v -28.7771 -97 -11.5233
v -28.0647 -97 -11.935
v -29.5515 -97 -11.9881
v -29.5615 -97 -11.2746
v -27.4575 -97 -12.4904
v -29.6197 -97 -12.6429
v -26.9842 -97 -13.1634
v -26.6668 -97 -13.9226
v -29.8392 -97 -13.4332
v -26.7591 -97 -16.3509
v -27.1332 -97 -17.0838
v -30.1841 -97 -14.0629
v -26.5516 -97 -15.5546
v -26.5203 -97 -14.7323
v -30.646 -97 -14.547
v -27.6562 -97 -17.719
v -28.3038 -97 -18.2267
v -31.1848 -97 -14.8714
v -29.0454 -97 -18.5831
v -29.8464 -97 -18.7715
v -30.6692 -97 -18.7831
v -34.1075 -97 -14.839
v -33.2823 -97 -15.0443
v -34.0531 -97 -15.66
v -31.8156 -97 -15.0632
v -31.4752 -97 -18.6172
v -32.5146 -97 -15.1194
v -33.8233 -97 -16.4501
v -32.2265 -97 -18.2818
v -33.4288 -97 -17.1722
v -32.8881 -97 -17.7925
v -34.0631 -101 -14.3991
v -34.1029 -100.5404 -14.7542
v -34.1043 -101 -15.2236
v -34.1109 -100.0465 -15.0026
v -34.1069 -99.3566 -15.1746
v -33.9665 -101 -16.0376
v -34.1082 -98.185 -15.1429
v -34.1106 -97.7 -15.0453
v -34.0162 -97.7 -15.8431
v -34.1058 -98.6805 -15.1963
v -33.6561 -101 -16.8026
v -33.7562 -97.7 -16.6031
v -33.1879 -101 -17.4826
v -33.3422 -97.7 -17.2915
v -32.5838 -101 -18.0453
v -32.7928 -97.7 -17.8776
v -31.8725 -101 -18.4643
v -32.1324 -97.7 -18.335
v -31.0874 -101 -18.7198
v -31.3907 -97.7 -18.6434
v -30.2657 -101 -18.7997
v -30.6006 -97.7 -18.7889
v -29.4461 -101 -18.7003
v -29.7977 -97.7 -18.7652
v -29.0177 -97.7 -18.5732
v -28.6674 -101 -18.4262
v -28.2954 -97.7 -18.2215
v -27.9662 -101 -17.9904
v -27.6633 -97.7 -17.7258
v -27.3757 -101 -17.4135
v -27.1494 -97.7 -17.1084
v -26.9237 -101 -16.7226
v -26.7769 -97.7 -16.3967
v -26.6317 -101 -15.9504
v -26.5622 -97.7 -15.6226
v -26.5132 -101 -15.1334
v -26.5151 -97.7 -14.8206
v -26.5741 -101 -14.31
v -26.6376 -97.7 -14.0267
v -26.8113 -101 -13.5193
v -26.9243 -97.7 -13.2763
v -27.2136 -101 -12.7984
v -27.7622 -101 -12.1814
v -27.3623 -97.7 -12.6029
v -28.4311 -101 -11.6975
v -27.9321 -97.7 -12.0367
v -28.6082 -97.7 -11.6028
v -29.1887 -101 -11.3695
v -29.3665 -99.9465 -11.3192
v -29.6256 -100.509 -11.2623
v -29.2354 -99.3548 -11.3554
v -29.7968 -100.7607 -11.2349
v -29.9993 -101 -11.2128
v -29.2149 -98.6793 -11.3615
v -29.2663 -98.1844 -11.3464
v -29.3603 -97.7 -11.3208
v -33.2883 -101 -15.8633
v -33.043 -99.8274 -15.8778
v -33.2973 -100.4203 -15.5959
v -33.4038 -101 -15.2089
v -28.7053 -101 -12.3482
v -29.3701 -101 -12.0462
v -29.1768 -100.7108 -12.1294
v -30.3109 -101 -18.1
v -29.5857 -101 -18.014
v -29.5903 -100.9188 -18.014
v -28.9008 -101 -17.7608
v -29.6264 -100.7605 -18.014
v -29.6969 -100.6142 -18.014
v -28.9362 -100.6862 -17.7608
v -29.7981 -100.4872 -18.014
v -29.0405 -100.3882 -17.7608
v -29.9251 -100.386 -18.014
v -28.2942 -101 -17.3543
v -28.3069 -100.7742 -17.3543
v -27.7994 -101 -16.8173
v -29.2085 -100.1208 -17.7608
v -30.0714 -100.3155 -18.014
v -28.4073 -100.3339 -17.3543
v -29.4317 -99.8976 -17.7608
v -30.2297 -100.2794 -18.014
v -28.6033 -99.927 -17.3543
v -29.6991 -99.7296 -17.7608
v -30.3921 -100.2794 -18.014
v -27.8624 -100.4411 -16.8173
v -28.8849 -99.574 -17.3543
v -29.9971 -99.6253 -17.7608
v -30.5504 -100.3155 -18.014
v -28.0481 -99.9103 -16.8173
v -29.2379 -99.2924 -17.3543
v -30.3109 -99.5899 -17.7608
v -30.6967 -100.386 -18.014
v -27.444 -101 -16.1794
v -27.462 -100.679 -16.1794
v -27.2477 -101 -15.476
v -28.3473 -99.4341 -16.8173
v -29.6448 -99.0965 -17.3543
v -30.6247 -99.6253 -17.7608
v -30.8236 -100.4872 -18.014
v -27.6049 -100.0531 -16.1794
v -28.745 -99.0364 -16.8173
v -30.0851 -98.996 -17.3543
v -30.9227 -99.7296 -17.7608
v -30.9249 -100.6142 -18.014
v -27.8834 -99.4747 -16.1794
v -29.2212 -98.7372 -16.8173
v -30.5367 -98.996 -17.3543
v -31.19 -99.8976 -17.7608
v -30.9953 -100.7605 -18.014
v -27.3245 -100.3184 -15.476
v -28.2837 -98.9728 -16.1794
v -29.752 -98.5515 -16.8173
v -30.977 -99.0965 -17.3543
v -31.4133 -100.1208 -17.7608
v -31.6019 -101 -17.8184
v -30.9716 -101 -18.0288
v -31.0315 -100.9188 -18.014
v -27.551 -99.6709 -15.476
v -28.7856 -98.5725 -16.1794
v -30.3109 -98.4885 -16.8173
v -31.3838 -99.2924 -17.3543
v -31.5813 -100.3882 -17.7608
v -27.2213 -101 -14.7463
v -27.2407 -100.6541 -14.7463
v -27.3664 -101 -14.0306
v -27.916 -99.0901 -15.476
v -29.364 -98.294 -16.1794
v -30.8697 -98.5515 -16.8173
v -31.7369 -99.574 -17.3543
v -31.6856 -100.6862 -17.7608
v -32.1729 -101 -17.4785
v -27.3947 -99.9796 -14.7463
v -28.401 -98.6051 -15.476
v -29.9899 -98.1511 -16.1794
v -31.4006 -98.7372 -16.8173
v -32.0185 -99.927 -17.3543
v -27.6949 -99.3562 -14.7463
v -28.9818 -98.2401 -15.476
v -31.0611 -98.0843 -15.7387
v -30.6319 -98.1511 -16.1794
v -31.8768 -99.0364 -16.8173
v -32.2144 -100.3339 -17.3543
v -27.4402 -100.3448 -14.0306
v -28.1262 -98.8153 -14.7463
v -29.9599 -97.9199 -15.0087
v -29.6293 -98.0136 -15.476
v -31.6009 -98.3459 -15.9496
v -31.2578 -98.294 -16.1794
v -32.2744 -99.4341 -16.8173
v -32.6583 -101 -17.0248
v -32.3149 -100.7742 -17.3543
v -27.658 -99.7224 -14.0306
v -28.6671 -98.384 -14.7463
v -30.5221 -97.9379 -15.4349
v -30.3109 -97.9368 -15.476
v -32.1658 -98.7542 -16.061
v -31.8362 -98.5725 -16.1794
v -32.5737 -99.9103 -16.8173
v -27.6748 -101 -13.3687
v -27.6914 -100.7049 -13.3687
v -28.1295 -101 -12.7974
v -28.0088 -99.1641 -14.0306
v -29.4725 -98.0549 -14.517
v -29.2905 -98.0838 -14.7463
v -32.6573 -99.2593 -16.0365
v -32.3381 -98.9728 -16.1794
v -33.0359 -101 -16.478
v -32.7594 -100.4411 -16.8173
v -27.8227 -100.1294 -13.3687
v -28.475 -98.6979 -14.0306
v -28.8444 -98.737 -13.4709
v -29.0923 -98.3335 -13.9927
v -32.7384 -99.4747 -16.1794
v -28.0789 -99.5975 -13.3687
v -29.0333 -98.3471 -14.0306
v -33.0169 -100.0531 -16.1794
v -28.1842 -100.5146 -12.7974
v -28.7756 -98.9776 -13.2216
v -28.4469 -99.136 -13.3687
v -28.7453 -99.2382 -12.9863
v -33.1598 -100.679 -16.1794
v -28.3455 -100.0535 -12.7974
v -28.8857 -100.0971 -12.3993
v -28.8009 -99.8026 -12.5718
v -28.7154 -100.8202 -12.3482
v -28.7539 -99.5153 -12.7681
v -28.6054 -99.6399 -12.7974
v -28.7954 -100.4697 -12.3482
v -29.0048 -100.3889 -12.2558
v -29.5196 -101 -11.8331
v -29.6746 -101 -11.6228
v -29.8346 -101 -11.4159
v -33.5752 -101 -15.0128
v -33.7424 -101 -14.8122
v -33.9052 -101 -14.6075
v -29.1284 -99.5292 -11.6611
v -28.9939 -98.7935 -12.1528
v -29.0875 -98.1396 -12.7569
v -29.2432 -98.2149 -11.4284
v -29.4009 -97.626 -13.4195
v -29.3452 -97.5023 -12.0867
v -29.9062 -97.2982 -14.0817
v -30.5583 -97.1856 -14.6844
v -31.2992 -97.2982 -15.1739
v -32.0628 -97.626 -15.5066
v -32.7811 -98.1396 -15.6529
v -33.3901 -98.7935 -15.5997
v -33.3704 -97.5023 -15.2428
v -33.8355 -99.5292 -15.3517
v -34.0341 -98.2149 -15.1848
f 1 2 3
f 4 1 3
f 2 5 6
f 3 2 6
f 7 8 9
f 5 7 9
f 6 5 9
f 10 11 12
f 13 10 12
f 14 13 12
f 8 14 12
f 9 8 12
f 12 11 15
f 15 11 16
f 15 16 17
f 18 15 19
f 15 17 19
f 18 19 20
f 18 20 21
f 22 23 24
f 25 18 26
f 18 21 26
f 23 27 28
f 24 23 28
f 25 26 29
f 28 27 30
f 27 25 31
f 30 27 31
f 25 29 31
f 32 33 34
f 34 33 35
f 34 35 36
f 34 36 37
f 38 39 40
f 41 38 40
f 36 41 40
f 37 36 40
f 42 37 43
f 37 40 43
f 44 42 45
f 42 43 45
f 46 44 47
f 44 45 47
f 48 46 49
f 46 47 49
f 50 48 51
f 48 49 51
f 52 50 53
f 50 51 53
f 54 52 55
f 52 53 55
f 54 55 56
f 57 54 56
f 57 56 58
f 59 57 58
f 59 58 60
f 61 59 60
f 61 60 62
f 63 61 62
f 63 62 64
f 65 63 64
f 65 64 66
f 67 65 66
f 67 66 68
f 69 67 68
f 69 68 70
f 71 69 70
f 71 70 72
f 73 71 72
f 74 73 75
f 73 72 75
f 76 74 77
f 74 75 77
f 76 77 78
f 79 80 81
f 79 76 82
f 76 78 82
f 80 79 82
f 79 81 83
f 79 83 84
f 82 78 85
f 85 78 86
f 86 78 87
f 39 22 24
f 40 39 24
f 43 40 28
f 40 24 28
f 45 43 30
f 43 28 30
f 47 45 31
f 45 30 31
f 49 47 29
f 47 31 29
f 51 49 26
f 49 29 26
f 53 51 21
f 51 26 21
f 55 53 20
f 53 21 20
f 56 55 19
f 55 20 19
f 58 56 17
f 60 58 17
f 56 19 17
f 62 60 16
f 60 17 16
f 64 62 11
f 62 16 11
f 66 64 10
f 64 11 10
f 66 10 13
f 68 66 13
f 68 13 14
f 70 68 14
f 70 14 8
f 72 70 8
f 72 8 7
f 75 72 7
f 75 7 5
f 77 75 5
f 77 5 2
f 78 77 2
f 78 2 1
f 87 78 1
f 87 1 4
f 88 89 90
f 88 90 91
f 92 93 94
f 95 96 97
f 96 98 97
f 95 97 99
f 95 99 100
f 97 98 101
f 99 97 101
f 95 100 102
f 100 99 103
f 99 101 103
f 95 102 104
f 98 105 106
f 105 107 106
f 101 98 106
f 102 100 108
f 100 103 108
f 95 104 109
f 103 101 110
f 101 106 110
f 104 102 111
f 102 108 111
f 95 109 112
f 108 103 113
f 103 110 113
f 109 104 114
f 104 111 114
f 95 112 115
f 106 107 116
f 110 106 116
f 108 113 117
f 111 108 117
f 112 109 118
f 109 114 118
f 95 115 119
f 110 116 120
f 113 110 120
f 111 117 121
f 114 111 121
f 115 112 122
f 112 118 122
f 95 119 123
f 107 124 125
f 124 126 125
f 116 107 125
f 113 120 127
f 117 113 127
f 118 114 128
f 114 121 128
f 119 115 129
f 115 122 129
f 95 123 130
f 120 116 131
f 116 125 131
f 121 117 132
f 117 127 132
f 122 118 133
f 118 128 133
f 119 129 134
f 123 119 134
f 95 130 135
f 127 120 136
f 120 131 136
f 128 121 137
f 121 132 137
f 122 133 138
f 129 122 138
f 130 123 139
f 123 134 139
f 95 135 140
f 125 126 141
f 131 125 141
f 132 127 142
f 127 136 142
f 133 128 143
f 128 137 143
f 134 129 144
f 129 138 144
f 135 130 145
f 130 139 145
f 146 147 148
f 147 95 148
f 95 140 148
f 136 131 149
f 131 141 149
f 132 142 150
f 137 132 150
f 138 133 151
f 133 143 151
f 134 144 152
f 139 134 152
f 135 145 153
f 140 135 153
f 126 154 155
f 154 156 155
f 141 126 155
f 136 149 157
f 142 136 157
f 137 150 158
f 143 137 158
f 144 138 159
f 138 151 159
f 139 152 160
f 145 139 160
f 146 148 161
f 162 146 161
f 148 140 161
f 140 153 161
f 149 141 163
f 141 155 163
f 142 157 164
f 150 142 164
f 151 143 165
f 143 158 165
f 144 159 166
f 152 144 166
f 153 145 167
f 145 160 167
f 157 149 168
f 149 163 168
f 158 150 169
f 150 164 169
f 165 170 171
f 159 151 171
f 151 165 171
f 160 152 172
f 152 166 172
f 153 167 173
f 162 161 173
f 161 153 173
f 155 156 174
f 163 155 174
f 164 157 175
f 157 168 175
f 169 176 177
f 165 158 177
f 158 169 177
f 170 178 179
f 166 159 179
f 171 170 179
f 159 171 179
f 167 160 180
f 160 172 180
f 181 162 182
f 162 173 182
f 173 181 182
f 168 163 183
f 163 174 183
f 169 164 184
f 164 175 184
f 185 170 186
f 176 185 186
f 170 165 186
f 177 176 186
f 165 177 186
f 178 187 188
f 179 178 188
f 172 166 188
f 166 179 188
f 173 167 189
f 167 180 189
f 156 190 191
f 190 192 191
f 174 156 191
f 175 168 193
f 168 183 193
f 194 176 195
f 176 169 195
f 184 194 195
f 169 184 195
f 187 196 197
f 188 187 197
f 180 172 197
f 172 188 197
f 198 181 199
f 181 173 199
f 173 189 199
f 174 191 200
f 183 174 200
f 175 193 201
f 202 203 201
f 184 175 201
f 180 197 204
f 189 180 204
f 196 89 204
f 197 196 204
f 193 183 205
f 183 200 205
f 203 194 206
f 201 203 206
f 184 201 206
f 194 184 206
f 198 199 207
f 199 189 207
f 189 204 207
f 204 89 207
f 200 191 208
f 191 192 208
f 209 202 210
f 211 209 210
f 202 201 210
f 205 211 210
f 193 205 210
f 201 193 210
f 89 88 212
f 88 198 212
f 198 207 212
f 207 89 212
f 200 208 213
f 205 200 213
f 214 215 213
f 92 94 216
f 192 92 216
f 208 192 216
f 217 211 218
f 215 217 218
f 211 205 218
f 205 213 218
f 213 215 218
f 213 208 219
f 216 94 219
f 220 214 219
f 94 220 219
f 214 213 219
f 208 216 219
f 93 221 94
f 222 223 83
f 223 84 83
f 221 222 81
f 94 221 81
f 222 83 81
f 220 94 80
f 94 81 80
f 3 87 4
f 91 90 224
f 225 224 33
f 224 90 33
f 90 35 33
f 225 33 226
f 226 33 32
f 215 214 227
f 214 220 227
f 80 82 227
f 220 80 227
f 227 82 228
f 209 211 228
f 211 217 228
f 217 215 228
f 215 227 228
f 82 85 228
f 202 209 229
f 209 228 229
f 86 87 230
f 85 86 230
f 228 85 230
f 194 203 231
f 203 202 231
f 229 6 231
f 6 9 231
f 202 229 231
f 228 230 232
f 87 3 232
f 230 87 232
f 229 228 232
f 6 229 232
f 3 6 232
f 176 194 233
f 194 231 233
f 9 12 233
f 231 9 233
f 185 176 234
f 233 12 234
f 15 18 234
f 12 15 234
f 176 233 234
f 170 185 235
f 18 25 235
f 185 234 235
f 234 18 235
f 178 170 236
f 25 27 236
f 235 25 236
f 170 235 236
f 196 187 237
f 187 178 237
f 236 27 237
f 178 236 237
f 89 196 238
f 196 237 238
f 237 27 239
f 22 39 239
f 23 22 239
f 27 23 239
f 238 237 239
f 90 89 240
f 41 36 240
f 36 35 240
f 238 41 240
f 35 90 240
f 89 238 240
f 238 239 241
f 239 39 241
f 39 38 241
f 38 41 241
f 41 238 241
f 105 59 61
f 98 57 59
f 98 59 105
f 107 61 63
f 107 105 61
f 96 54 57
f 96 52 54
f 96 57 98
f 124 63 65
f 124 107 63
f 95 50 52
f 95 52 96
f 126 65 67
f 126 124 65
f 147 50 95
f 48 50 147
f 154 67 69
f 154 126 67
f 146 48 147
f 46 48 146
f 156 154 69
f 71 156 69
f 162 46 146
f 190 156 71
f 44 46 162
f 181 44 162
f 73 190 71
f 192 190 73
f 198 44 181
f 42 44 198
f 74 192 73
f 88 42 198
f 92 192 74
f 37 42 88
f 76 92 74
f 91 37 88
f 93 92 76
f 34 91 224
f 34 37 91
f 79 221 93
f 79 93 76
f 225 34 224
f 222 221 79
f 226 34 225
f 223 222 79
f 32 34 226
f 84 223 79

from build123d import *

# Parameters (mm, degrees)
KEYED_BACK_DEPTH   = 0.7
CUP_BLANK_SKETCH_R = 3.8
CUP_BLANK_DEPTH    = 3.3


with BuildPart() as part:
    # Keyed Back Sketch → Keyed Back (new body)
    with BuildSketch(Plane(origin=(0, -97, 0), x_dir=(-1, 0, 0), z_dir=(0, -1, 0))):
        with BuildLine():
            Line((29.790988145, 11.23573341), (33.83079012, 13.568114168))
            ThreePointArc((33.83079012, 13.568114168), (28.410889132, 18.290896534), (29.790988145, 11.23573341))
        make_face()
    extrude(amount=KEYED_BACK_DEPTH)

    # Cup Blank Sketch → Cup Blank (add)
    with BuildSketch(Plane(origin=(0, -97.7, 0), x_dir=(-1, 0, 0), z_dir=(0, -1, 0))):
        with Locations(Location((30.310889132, 15, 0), (0, 0, 262.136353638))):
            Circle(CUP_BLANK_SKETCH_R)
    extrude(amount=CUP_BLANK_DEPTH)

    # Spherical Bearing Seat profile → Spherical Bearing Seat (revolve, cut)
    with BuildSketch(Plane(origin=(0, -101, 0), x_dir=(-1, 0, 0), z_dir=(0, -1, 0))):
        with BuildLine():
            Line((30.310889132, 11.9), (30.310889132, 18.1))
            ThreePointArc((30.310889132, 18.1), (27.210889132, 15), (30.310889132, 11.9))
        make_face()
    revolve(axis=Axis((-30.310889132, -101, -25), (0, 0, 1)), mode=Mode.SUBTRACT)

    # Articulation Throat Sketch → Articulation Throat (revolve, cut)
    with BuildSketch(Plane(origin=(-55.559435073, -21.315405316, -26.260716517), x_dir=(0.37694407644157146, 0.1446147852349051, -0.9148768917876727), z_dir=(0.8541721659092646, 0.32770358269776195, 0.4037329227012915))):
        Polygon((-12.308450042, -83.441173866), (-10.724100051, -81.773890115), (-22.767880189, -61.059022025), (-28.981287547, -67.597673951), align=None)
    revolve(axis=Axis((-25.110986143, -106.383086561, -21.631997284), (-0.5199902989343897, 0.5383086561091633, 0.6631997284167648)), mode=Mode.SUBTRACT)


solid = part.part
